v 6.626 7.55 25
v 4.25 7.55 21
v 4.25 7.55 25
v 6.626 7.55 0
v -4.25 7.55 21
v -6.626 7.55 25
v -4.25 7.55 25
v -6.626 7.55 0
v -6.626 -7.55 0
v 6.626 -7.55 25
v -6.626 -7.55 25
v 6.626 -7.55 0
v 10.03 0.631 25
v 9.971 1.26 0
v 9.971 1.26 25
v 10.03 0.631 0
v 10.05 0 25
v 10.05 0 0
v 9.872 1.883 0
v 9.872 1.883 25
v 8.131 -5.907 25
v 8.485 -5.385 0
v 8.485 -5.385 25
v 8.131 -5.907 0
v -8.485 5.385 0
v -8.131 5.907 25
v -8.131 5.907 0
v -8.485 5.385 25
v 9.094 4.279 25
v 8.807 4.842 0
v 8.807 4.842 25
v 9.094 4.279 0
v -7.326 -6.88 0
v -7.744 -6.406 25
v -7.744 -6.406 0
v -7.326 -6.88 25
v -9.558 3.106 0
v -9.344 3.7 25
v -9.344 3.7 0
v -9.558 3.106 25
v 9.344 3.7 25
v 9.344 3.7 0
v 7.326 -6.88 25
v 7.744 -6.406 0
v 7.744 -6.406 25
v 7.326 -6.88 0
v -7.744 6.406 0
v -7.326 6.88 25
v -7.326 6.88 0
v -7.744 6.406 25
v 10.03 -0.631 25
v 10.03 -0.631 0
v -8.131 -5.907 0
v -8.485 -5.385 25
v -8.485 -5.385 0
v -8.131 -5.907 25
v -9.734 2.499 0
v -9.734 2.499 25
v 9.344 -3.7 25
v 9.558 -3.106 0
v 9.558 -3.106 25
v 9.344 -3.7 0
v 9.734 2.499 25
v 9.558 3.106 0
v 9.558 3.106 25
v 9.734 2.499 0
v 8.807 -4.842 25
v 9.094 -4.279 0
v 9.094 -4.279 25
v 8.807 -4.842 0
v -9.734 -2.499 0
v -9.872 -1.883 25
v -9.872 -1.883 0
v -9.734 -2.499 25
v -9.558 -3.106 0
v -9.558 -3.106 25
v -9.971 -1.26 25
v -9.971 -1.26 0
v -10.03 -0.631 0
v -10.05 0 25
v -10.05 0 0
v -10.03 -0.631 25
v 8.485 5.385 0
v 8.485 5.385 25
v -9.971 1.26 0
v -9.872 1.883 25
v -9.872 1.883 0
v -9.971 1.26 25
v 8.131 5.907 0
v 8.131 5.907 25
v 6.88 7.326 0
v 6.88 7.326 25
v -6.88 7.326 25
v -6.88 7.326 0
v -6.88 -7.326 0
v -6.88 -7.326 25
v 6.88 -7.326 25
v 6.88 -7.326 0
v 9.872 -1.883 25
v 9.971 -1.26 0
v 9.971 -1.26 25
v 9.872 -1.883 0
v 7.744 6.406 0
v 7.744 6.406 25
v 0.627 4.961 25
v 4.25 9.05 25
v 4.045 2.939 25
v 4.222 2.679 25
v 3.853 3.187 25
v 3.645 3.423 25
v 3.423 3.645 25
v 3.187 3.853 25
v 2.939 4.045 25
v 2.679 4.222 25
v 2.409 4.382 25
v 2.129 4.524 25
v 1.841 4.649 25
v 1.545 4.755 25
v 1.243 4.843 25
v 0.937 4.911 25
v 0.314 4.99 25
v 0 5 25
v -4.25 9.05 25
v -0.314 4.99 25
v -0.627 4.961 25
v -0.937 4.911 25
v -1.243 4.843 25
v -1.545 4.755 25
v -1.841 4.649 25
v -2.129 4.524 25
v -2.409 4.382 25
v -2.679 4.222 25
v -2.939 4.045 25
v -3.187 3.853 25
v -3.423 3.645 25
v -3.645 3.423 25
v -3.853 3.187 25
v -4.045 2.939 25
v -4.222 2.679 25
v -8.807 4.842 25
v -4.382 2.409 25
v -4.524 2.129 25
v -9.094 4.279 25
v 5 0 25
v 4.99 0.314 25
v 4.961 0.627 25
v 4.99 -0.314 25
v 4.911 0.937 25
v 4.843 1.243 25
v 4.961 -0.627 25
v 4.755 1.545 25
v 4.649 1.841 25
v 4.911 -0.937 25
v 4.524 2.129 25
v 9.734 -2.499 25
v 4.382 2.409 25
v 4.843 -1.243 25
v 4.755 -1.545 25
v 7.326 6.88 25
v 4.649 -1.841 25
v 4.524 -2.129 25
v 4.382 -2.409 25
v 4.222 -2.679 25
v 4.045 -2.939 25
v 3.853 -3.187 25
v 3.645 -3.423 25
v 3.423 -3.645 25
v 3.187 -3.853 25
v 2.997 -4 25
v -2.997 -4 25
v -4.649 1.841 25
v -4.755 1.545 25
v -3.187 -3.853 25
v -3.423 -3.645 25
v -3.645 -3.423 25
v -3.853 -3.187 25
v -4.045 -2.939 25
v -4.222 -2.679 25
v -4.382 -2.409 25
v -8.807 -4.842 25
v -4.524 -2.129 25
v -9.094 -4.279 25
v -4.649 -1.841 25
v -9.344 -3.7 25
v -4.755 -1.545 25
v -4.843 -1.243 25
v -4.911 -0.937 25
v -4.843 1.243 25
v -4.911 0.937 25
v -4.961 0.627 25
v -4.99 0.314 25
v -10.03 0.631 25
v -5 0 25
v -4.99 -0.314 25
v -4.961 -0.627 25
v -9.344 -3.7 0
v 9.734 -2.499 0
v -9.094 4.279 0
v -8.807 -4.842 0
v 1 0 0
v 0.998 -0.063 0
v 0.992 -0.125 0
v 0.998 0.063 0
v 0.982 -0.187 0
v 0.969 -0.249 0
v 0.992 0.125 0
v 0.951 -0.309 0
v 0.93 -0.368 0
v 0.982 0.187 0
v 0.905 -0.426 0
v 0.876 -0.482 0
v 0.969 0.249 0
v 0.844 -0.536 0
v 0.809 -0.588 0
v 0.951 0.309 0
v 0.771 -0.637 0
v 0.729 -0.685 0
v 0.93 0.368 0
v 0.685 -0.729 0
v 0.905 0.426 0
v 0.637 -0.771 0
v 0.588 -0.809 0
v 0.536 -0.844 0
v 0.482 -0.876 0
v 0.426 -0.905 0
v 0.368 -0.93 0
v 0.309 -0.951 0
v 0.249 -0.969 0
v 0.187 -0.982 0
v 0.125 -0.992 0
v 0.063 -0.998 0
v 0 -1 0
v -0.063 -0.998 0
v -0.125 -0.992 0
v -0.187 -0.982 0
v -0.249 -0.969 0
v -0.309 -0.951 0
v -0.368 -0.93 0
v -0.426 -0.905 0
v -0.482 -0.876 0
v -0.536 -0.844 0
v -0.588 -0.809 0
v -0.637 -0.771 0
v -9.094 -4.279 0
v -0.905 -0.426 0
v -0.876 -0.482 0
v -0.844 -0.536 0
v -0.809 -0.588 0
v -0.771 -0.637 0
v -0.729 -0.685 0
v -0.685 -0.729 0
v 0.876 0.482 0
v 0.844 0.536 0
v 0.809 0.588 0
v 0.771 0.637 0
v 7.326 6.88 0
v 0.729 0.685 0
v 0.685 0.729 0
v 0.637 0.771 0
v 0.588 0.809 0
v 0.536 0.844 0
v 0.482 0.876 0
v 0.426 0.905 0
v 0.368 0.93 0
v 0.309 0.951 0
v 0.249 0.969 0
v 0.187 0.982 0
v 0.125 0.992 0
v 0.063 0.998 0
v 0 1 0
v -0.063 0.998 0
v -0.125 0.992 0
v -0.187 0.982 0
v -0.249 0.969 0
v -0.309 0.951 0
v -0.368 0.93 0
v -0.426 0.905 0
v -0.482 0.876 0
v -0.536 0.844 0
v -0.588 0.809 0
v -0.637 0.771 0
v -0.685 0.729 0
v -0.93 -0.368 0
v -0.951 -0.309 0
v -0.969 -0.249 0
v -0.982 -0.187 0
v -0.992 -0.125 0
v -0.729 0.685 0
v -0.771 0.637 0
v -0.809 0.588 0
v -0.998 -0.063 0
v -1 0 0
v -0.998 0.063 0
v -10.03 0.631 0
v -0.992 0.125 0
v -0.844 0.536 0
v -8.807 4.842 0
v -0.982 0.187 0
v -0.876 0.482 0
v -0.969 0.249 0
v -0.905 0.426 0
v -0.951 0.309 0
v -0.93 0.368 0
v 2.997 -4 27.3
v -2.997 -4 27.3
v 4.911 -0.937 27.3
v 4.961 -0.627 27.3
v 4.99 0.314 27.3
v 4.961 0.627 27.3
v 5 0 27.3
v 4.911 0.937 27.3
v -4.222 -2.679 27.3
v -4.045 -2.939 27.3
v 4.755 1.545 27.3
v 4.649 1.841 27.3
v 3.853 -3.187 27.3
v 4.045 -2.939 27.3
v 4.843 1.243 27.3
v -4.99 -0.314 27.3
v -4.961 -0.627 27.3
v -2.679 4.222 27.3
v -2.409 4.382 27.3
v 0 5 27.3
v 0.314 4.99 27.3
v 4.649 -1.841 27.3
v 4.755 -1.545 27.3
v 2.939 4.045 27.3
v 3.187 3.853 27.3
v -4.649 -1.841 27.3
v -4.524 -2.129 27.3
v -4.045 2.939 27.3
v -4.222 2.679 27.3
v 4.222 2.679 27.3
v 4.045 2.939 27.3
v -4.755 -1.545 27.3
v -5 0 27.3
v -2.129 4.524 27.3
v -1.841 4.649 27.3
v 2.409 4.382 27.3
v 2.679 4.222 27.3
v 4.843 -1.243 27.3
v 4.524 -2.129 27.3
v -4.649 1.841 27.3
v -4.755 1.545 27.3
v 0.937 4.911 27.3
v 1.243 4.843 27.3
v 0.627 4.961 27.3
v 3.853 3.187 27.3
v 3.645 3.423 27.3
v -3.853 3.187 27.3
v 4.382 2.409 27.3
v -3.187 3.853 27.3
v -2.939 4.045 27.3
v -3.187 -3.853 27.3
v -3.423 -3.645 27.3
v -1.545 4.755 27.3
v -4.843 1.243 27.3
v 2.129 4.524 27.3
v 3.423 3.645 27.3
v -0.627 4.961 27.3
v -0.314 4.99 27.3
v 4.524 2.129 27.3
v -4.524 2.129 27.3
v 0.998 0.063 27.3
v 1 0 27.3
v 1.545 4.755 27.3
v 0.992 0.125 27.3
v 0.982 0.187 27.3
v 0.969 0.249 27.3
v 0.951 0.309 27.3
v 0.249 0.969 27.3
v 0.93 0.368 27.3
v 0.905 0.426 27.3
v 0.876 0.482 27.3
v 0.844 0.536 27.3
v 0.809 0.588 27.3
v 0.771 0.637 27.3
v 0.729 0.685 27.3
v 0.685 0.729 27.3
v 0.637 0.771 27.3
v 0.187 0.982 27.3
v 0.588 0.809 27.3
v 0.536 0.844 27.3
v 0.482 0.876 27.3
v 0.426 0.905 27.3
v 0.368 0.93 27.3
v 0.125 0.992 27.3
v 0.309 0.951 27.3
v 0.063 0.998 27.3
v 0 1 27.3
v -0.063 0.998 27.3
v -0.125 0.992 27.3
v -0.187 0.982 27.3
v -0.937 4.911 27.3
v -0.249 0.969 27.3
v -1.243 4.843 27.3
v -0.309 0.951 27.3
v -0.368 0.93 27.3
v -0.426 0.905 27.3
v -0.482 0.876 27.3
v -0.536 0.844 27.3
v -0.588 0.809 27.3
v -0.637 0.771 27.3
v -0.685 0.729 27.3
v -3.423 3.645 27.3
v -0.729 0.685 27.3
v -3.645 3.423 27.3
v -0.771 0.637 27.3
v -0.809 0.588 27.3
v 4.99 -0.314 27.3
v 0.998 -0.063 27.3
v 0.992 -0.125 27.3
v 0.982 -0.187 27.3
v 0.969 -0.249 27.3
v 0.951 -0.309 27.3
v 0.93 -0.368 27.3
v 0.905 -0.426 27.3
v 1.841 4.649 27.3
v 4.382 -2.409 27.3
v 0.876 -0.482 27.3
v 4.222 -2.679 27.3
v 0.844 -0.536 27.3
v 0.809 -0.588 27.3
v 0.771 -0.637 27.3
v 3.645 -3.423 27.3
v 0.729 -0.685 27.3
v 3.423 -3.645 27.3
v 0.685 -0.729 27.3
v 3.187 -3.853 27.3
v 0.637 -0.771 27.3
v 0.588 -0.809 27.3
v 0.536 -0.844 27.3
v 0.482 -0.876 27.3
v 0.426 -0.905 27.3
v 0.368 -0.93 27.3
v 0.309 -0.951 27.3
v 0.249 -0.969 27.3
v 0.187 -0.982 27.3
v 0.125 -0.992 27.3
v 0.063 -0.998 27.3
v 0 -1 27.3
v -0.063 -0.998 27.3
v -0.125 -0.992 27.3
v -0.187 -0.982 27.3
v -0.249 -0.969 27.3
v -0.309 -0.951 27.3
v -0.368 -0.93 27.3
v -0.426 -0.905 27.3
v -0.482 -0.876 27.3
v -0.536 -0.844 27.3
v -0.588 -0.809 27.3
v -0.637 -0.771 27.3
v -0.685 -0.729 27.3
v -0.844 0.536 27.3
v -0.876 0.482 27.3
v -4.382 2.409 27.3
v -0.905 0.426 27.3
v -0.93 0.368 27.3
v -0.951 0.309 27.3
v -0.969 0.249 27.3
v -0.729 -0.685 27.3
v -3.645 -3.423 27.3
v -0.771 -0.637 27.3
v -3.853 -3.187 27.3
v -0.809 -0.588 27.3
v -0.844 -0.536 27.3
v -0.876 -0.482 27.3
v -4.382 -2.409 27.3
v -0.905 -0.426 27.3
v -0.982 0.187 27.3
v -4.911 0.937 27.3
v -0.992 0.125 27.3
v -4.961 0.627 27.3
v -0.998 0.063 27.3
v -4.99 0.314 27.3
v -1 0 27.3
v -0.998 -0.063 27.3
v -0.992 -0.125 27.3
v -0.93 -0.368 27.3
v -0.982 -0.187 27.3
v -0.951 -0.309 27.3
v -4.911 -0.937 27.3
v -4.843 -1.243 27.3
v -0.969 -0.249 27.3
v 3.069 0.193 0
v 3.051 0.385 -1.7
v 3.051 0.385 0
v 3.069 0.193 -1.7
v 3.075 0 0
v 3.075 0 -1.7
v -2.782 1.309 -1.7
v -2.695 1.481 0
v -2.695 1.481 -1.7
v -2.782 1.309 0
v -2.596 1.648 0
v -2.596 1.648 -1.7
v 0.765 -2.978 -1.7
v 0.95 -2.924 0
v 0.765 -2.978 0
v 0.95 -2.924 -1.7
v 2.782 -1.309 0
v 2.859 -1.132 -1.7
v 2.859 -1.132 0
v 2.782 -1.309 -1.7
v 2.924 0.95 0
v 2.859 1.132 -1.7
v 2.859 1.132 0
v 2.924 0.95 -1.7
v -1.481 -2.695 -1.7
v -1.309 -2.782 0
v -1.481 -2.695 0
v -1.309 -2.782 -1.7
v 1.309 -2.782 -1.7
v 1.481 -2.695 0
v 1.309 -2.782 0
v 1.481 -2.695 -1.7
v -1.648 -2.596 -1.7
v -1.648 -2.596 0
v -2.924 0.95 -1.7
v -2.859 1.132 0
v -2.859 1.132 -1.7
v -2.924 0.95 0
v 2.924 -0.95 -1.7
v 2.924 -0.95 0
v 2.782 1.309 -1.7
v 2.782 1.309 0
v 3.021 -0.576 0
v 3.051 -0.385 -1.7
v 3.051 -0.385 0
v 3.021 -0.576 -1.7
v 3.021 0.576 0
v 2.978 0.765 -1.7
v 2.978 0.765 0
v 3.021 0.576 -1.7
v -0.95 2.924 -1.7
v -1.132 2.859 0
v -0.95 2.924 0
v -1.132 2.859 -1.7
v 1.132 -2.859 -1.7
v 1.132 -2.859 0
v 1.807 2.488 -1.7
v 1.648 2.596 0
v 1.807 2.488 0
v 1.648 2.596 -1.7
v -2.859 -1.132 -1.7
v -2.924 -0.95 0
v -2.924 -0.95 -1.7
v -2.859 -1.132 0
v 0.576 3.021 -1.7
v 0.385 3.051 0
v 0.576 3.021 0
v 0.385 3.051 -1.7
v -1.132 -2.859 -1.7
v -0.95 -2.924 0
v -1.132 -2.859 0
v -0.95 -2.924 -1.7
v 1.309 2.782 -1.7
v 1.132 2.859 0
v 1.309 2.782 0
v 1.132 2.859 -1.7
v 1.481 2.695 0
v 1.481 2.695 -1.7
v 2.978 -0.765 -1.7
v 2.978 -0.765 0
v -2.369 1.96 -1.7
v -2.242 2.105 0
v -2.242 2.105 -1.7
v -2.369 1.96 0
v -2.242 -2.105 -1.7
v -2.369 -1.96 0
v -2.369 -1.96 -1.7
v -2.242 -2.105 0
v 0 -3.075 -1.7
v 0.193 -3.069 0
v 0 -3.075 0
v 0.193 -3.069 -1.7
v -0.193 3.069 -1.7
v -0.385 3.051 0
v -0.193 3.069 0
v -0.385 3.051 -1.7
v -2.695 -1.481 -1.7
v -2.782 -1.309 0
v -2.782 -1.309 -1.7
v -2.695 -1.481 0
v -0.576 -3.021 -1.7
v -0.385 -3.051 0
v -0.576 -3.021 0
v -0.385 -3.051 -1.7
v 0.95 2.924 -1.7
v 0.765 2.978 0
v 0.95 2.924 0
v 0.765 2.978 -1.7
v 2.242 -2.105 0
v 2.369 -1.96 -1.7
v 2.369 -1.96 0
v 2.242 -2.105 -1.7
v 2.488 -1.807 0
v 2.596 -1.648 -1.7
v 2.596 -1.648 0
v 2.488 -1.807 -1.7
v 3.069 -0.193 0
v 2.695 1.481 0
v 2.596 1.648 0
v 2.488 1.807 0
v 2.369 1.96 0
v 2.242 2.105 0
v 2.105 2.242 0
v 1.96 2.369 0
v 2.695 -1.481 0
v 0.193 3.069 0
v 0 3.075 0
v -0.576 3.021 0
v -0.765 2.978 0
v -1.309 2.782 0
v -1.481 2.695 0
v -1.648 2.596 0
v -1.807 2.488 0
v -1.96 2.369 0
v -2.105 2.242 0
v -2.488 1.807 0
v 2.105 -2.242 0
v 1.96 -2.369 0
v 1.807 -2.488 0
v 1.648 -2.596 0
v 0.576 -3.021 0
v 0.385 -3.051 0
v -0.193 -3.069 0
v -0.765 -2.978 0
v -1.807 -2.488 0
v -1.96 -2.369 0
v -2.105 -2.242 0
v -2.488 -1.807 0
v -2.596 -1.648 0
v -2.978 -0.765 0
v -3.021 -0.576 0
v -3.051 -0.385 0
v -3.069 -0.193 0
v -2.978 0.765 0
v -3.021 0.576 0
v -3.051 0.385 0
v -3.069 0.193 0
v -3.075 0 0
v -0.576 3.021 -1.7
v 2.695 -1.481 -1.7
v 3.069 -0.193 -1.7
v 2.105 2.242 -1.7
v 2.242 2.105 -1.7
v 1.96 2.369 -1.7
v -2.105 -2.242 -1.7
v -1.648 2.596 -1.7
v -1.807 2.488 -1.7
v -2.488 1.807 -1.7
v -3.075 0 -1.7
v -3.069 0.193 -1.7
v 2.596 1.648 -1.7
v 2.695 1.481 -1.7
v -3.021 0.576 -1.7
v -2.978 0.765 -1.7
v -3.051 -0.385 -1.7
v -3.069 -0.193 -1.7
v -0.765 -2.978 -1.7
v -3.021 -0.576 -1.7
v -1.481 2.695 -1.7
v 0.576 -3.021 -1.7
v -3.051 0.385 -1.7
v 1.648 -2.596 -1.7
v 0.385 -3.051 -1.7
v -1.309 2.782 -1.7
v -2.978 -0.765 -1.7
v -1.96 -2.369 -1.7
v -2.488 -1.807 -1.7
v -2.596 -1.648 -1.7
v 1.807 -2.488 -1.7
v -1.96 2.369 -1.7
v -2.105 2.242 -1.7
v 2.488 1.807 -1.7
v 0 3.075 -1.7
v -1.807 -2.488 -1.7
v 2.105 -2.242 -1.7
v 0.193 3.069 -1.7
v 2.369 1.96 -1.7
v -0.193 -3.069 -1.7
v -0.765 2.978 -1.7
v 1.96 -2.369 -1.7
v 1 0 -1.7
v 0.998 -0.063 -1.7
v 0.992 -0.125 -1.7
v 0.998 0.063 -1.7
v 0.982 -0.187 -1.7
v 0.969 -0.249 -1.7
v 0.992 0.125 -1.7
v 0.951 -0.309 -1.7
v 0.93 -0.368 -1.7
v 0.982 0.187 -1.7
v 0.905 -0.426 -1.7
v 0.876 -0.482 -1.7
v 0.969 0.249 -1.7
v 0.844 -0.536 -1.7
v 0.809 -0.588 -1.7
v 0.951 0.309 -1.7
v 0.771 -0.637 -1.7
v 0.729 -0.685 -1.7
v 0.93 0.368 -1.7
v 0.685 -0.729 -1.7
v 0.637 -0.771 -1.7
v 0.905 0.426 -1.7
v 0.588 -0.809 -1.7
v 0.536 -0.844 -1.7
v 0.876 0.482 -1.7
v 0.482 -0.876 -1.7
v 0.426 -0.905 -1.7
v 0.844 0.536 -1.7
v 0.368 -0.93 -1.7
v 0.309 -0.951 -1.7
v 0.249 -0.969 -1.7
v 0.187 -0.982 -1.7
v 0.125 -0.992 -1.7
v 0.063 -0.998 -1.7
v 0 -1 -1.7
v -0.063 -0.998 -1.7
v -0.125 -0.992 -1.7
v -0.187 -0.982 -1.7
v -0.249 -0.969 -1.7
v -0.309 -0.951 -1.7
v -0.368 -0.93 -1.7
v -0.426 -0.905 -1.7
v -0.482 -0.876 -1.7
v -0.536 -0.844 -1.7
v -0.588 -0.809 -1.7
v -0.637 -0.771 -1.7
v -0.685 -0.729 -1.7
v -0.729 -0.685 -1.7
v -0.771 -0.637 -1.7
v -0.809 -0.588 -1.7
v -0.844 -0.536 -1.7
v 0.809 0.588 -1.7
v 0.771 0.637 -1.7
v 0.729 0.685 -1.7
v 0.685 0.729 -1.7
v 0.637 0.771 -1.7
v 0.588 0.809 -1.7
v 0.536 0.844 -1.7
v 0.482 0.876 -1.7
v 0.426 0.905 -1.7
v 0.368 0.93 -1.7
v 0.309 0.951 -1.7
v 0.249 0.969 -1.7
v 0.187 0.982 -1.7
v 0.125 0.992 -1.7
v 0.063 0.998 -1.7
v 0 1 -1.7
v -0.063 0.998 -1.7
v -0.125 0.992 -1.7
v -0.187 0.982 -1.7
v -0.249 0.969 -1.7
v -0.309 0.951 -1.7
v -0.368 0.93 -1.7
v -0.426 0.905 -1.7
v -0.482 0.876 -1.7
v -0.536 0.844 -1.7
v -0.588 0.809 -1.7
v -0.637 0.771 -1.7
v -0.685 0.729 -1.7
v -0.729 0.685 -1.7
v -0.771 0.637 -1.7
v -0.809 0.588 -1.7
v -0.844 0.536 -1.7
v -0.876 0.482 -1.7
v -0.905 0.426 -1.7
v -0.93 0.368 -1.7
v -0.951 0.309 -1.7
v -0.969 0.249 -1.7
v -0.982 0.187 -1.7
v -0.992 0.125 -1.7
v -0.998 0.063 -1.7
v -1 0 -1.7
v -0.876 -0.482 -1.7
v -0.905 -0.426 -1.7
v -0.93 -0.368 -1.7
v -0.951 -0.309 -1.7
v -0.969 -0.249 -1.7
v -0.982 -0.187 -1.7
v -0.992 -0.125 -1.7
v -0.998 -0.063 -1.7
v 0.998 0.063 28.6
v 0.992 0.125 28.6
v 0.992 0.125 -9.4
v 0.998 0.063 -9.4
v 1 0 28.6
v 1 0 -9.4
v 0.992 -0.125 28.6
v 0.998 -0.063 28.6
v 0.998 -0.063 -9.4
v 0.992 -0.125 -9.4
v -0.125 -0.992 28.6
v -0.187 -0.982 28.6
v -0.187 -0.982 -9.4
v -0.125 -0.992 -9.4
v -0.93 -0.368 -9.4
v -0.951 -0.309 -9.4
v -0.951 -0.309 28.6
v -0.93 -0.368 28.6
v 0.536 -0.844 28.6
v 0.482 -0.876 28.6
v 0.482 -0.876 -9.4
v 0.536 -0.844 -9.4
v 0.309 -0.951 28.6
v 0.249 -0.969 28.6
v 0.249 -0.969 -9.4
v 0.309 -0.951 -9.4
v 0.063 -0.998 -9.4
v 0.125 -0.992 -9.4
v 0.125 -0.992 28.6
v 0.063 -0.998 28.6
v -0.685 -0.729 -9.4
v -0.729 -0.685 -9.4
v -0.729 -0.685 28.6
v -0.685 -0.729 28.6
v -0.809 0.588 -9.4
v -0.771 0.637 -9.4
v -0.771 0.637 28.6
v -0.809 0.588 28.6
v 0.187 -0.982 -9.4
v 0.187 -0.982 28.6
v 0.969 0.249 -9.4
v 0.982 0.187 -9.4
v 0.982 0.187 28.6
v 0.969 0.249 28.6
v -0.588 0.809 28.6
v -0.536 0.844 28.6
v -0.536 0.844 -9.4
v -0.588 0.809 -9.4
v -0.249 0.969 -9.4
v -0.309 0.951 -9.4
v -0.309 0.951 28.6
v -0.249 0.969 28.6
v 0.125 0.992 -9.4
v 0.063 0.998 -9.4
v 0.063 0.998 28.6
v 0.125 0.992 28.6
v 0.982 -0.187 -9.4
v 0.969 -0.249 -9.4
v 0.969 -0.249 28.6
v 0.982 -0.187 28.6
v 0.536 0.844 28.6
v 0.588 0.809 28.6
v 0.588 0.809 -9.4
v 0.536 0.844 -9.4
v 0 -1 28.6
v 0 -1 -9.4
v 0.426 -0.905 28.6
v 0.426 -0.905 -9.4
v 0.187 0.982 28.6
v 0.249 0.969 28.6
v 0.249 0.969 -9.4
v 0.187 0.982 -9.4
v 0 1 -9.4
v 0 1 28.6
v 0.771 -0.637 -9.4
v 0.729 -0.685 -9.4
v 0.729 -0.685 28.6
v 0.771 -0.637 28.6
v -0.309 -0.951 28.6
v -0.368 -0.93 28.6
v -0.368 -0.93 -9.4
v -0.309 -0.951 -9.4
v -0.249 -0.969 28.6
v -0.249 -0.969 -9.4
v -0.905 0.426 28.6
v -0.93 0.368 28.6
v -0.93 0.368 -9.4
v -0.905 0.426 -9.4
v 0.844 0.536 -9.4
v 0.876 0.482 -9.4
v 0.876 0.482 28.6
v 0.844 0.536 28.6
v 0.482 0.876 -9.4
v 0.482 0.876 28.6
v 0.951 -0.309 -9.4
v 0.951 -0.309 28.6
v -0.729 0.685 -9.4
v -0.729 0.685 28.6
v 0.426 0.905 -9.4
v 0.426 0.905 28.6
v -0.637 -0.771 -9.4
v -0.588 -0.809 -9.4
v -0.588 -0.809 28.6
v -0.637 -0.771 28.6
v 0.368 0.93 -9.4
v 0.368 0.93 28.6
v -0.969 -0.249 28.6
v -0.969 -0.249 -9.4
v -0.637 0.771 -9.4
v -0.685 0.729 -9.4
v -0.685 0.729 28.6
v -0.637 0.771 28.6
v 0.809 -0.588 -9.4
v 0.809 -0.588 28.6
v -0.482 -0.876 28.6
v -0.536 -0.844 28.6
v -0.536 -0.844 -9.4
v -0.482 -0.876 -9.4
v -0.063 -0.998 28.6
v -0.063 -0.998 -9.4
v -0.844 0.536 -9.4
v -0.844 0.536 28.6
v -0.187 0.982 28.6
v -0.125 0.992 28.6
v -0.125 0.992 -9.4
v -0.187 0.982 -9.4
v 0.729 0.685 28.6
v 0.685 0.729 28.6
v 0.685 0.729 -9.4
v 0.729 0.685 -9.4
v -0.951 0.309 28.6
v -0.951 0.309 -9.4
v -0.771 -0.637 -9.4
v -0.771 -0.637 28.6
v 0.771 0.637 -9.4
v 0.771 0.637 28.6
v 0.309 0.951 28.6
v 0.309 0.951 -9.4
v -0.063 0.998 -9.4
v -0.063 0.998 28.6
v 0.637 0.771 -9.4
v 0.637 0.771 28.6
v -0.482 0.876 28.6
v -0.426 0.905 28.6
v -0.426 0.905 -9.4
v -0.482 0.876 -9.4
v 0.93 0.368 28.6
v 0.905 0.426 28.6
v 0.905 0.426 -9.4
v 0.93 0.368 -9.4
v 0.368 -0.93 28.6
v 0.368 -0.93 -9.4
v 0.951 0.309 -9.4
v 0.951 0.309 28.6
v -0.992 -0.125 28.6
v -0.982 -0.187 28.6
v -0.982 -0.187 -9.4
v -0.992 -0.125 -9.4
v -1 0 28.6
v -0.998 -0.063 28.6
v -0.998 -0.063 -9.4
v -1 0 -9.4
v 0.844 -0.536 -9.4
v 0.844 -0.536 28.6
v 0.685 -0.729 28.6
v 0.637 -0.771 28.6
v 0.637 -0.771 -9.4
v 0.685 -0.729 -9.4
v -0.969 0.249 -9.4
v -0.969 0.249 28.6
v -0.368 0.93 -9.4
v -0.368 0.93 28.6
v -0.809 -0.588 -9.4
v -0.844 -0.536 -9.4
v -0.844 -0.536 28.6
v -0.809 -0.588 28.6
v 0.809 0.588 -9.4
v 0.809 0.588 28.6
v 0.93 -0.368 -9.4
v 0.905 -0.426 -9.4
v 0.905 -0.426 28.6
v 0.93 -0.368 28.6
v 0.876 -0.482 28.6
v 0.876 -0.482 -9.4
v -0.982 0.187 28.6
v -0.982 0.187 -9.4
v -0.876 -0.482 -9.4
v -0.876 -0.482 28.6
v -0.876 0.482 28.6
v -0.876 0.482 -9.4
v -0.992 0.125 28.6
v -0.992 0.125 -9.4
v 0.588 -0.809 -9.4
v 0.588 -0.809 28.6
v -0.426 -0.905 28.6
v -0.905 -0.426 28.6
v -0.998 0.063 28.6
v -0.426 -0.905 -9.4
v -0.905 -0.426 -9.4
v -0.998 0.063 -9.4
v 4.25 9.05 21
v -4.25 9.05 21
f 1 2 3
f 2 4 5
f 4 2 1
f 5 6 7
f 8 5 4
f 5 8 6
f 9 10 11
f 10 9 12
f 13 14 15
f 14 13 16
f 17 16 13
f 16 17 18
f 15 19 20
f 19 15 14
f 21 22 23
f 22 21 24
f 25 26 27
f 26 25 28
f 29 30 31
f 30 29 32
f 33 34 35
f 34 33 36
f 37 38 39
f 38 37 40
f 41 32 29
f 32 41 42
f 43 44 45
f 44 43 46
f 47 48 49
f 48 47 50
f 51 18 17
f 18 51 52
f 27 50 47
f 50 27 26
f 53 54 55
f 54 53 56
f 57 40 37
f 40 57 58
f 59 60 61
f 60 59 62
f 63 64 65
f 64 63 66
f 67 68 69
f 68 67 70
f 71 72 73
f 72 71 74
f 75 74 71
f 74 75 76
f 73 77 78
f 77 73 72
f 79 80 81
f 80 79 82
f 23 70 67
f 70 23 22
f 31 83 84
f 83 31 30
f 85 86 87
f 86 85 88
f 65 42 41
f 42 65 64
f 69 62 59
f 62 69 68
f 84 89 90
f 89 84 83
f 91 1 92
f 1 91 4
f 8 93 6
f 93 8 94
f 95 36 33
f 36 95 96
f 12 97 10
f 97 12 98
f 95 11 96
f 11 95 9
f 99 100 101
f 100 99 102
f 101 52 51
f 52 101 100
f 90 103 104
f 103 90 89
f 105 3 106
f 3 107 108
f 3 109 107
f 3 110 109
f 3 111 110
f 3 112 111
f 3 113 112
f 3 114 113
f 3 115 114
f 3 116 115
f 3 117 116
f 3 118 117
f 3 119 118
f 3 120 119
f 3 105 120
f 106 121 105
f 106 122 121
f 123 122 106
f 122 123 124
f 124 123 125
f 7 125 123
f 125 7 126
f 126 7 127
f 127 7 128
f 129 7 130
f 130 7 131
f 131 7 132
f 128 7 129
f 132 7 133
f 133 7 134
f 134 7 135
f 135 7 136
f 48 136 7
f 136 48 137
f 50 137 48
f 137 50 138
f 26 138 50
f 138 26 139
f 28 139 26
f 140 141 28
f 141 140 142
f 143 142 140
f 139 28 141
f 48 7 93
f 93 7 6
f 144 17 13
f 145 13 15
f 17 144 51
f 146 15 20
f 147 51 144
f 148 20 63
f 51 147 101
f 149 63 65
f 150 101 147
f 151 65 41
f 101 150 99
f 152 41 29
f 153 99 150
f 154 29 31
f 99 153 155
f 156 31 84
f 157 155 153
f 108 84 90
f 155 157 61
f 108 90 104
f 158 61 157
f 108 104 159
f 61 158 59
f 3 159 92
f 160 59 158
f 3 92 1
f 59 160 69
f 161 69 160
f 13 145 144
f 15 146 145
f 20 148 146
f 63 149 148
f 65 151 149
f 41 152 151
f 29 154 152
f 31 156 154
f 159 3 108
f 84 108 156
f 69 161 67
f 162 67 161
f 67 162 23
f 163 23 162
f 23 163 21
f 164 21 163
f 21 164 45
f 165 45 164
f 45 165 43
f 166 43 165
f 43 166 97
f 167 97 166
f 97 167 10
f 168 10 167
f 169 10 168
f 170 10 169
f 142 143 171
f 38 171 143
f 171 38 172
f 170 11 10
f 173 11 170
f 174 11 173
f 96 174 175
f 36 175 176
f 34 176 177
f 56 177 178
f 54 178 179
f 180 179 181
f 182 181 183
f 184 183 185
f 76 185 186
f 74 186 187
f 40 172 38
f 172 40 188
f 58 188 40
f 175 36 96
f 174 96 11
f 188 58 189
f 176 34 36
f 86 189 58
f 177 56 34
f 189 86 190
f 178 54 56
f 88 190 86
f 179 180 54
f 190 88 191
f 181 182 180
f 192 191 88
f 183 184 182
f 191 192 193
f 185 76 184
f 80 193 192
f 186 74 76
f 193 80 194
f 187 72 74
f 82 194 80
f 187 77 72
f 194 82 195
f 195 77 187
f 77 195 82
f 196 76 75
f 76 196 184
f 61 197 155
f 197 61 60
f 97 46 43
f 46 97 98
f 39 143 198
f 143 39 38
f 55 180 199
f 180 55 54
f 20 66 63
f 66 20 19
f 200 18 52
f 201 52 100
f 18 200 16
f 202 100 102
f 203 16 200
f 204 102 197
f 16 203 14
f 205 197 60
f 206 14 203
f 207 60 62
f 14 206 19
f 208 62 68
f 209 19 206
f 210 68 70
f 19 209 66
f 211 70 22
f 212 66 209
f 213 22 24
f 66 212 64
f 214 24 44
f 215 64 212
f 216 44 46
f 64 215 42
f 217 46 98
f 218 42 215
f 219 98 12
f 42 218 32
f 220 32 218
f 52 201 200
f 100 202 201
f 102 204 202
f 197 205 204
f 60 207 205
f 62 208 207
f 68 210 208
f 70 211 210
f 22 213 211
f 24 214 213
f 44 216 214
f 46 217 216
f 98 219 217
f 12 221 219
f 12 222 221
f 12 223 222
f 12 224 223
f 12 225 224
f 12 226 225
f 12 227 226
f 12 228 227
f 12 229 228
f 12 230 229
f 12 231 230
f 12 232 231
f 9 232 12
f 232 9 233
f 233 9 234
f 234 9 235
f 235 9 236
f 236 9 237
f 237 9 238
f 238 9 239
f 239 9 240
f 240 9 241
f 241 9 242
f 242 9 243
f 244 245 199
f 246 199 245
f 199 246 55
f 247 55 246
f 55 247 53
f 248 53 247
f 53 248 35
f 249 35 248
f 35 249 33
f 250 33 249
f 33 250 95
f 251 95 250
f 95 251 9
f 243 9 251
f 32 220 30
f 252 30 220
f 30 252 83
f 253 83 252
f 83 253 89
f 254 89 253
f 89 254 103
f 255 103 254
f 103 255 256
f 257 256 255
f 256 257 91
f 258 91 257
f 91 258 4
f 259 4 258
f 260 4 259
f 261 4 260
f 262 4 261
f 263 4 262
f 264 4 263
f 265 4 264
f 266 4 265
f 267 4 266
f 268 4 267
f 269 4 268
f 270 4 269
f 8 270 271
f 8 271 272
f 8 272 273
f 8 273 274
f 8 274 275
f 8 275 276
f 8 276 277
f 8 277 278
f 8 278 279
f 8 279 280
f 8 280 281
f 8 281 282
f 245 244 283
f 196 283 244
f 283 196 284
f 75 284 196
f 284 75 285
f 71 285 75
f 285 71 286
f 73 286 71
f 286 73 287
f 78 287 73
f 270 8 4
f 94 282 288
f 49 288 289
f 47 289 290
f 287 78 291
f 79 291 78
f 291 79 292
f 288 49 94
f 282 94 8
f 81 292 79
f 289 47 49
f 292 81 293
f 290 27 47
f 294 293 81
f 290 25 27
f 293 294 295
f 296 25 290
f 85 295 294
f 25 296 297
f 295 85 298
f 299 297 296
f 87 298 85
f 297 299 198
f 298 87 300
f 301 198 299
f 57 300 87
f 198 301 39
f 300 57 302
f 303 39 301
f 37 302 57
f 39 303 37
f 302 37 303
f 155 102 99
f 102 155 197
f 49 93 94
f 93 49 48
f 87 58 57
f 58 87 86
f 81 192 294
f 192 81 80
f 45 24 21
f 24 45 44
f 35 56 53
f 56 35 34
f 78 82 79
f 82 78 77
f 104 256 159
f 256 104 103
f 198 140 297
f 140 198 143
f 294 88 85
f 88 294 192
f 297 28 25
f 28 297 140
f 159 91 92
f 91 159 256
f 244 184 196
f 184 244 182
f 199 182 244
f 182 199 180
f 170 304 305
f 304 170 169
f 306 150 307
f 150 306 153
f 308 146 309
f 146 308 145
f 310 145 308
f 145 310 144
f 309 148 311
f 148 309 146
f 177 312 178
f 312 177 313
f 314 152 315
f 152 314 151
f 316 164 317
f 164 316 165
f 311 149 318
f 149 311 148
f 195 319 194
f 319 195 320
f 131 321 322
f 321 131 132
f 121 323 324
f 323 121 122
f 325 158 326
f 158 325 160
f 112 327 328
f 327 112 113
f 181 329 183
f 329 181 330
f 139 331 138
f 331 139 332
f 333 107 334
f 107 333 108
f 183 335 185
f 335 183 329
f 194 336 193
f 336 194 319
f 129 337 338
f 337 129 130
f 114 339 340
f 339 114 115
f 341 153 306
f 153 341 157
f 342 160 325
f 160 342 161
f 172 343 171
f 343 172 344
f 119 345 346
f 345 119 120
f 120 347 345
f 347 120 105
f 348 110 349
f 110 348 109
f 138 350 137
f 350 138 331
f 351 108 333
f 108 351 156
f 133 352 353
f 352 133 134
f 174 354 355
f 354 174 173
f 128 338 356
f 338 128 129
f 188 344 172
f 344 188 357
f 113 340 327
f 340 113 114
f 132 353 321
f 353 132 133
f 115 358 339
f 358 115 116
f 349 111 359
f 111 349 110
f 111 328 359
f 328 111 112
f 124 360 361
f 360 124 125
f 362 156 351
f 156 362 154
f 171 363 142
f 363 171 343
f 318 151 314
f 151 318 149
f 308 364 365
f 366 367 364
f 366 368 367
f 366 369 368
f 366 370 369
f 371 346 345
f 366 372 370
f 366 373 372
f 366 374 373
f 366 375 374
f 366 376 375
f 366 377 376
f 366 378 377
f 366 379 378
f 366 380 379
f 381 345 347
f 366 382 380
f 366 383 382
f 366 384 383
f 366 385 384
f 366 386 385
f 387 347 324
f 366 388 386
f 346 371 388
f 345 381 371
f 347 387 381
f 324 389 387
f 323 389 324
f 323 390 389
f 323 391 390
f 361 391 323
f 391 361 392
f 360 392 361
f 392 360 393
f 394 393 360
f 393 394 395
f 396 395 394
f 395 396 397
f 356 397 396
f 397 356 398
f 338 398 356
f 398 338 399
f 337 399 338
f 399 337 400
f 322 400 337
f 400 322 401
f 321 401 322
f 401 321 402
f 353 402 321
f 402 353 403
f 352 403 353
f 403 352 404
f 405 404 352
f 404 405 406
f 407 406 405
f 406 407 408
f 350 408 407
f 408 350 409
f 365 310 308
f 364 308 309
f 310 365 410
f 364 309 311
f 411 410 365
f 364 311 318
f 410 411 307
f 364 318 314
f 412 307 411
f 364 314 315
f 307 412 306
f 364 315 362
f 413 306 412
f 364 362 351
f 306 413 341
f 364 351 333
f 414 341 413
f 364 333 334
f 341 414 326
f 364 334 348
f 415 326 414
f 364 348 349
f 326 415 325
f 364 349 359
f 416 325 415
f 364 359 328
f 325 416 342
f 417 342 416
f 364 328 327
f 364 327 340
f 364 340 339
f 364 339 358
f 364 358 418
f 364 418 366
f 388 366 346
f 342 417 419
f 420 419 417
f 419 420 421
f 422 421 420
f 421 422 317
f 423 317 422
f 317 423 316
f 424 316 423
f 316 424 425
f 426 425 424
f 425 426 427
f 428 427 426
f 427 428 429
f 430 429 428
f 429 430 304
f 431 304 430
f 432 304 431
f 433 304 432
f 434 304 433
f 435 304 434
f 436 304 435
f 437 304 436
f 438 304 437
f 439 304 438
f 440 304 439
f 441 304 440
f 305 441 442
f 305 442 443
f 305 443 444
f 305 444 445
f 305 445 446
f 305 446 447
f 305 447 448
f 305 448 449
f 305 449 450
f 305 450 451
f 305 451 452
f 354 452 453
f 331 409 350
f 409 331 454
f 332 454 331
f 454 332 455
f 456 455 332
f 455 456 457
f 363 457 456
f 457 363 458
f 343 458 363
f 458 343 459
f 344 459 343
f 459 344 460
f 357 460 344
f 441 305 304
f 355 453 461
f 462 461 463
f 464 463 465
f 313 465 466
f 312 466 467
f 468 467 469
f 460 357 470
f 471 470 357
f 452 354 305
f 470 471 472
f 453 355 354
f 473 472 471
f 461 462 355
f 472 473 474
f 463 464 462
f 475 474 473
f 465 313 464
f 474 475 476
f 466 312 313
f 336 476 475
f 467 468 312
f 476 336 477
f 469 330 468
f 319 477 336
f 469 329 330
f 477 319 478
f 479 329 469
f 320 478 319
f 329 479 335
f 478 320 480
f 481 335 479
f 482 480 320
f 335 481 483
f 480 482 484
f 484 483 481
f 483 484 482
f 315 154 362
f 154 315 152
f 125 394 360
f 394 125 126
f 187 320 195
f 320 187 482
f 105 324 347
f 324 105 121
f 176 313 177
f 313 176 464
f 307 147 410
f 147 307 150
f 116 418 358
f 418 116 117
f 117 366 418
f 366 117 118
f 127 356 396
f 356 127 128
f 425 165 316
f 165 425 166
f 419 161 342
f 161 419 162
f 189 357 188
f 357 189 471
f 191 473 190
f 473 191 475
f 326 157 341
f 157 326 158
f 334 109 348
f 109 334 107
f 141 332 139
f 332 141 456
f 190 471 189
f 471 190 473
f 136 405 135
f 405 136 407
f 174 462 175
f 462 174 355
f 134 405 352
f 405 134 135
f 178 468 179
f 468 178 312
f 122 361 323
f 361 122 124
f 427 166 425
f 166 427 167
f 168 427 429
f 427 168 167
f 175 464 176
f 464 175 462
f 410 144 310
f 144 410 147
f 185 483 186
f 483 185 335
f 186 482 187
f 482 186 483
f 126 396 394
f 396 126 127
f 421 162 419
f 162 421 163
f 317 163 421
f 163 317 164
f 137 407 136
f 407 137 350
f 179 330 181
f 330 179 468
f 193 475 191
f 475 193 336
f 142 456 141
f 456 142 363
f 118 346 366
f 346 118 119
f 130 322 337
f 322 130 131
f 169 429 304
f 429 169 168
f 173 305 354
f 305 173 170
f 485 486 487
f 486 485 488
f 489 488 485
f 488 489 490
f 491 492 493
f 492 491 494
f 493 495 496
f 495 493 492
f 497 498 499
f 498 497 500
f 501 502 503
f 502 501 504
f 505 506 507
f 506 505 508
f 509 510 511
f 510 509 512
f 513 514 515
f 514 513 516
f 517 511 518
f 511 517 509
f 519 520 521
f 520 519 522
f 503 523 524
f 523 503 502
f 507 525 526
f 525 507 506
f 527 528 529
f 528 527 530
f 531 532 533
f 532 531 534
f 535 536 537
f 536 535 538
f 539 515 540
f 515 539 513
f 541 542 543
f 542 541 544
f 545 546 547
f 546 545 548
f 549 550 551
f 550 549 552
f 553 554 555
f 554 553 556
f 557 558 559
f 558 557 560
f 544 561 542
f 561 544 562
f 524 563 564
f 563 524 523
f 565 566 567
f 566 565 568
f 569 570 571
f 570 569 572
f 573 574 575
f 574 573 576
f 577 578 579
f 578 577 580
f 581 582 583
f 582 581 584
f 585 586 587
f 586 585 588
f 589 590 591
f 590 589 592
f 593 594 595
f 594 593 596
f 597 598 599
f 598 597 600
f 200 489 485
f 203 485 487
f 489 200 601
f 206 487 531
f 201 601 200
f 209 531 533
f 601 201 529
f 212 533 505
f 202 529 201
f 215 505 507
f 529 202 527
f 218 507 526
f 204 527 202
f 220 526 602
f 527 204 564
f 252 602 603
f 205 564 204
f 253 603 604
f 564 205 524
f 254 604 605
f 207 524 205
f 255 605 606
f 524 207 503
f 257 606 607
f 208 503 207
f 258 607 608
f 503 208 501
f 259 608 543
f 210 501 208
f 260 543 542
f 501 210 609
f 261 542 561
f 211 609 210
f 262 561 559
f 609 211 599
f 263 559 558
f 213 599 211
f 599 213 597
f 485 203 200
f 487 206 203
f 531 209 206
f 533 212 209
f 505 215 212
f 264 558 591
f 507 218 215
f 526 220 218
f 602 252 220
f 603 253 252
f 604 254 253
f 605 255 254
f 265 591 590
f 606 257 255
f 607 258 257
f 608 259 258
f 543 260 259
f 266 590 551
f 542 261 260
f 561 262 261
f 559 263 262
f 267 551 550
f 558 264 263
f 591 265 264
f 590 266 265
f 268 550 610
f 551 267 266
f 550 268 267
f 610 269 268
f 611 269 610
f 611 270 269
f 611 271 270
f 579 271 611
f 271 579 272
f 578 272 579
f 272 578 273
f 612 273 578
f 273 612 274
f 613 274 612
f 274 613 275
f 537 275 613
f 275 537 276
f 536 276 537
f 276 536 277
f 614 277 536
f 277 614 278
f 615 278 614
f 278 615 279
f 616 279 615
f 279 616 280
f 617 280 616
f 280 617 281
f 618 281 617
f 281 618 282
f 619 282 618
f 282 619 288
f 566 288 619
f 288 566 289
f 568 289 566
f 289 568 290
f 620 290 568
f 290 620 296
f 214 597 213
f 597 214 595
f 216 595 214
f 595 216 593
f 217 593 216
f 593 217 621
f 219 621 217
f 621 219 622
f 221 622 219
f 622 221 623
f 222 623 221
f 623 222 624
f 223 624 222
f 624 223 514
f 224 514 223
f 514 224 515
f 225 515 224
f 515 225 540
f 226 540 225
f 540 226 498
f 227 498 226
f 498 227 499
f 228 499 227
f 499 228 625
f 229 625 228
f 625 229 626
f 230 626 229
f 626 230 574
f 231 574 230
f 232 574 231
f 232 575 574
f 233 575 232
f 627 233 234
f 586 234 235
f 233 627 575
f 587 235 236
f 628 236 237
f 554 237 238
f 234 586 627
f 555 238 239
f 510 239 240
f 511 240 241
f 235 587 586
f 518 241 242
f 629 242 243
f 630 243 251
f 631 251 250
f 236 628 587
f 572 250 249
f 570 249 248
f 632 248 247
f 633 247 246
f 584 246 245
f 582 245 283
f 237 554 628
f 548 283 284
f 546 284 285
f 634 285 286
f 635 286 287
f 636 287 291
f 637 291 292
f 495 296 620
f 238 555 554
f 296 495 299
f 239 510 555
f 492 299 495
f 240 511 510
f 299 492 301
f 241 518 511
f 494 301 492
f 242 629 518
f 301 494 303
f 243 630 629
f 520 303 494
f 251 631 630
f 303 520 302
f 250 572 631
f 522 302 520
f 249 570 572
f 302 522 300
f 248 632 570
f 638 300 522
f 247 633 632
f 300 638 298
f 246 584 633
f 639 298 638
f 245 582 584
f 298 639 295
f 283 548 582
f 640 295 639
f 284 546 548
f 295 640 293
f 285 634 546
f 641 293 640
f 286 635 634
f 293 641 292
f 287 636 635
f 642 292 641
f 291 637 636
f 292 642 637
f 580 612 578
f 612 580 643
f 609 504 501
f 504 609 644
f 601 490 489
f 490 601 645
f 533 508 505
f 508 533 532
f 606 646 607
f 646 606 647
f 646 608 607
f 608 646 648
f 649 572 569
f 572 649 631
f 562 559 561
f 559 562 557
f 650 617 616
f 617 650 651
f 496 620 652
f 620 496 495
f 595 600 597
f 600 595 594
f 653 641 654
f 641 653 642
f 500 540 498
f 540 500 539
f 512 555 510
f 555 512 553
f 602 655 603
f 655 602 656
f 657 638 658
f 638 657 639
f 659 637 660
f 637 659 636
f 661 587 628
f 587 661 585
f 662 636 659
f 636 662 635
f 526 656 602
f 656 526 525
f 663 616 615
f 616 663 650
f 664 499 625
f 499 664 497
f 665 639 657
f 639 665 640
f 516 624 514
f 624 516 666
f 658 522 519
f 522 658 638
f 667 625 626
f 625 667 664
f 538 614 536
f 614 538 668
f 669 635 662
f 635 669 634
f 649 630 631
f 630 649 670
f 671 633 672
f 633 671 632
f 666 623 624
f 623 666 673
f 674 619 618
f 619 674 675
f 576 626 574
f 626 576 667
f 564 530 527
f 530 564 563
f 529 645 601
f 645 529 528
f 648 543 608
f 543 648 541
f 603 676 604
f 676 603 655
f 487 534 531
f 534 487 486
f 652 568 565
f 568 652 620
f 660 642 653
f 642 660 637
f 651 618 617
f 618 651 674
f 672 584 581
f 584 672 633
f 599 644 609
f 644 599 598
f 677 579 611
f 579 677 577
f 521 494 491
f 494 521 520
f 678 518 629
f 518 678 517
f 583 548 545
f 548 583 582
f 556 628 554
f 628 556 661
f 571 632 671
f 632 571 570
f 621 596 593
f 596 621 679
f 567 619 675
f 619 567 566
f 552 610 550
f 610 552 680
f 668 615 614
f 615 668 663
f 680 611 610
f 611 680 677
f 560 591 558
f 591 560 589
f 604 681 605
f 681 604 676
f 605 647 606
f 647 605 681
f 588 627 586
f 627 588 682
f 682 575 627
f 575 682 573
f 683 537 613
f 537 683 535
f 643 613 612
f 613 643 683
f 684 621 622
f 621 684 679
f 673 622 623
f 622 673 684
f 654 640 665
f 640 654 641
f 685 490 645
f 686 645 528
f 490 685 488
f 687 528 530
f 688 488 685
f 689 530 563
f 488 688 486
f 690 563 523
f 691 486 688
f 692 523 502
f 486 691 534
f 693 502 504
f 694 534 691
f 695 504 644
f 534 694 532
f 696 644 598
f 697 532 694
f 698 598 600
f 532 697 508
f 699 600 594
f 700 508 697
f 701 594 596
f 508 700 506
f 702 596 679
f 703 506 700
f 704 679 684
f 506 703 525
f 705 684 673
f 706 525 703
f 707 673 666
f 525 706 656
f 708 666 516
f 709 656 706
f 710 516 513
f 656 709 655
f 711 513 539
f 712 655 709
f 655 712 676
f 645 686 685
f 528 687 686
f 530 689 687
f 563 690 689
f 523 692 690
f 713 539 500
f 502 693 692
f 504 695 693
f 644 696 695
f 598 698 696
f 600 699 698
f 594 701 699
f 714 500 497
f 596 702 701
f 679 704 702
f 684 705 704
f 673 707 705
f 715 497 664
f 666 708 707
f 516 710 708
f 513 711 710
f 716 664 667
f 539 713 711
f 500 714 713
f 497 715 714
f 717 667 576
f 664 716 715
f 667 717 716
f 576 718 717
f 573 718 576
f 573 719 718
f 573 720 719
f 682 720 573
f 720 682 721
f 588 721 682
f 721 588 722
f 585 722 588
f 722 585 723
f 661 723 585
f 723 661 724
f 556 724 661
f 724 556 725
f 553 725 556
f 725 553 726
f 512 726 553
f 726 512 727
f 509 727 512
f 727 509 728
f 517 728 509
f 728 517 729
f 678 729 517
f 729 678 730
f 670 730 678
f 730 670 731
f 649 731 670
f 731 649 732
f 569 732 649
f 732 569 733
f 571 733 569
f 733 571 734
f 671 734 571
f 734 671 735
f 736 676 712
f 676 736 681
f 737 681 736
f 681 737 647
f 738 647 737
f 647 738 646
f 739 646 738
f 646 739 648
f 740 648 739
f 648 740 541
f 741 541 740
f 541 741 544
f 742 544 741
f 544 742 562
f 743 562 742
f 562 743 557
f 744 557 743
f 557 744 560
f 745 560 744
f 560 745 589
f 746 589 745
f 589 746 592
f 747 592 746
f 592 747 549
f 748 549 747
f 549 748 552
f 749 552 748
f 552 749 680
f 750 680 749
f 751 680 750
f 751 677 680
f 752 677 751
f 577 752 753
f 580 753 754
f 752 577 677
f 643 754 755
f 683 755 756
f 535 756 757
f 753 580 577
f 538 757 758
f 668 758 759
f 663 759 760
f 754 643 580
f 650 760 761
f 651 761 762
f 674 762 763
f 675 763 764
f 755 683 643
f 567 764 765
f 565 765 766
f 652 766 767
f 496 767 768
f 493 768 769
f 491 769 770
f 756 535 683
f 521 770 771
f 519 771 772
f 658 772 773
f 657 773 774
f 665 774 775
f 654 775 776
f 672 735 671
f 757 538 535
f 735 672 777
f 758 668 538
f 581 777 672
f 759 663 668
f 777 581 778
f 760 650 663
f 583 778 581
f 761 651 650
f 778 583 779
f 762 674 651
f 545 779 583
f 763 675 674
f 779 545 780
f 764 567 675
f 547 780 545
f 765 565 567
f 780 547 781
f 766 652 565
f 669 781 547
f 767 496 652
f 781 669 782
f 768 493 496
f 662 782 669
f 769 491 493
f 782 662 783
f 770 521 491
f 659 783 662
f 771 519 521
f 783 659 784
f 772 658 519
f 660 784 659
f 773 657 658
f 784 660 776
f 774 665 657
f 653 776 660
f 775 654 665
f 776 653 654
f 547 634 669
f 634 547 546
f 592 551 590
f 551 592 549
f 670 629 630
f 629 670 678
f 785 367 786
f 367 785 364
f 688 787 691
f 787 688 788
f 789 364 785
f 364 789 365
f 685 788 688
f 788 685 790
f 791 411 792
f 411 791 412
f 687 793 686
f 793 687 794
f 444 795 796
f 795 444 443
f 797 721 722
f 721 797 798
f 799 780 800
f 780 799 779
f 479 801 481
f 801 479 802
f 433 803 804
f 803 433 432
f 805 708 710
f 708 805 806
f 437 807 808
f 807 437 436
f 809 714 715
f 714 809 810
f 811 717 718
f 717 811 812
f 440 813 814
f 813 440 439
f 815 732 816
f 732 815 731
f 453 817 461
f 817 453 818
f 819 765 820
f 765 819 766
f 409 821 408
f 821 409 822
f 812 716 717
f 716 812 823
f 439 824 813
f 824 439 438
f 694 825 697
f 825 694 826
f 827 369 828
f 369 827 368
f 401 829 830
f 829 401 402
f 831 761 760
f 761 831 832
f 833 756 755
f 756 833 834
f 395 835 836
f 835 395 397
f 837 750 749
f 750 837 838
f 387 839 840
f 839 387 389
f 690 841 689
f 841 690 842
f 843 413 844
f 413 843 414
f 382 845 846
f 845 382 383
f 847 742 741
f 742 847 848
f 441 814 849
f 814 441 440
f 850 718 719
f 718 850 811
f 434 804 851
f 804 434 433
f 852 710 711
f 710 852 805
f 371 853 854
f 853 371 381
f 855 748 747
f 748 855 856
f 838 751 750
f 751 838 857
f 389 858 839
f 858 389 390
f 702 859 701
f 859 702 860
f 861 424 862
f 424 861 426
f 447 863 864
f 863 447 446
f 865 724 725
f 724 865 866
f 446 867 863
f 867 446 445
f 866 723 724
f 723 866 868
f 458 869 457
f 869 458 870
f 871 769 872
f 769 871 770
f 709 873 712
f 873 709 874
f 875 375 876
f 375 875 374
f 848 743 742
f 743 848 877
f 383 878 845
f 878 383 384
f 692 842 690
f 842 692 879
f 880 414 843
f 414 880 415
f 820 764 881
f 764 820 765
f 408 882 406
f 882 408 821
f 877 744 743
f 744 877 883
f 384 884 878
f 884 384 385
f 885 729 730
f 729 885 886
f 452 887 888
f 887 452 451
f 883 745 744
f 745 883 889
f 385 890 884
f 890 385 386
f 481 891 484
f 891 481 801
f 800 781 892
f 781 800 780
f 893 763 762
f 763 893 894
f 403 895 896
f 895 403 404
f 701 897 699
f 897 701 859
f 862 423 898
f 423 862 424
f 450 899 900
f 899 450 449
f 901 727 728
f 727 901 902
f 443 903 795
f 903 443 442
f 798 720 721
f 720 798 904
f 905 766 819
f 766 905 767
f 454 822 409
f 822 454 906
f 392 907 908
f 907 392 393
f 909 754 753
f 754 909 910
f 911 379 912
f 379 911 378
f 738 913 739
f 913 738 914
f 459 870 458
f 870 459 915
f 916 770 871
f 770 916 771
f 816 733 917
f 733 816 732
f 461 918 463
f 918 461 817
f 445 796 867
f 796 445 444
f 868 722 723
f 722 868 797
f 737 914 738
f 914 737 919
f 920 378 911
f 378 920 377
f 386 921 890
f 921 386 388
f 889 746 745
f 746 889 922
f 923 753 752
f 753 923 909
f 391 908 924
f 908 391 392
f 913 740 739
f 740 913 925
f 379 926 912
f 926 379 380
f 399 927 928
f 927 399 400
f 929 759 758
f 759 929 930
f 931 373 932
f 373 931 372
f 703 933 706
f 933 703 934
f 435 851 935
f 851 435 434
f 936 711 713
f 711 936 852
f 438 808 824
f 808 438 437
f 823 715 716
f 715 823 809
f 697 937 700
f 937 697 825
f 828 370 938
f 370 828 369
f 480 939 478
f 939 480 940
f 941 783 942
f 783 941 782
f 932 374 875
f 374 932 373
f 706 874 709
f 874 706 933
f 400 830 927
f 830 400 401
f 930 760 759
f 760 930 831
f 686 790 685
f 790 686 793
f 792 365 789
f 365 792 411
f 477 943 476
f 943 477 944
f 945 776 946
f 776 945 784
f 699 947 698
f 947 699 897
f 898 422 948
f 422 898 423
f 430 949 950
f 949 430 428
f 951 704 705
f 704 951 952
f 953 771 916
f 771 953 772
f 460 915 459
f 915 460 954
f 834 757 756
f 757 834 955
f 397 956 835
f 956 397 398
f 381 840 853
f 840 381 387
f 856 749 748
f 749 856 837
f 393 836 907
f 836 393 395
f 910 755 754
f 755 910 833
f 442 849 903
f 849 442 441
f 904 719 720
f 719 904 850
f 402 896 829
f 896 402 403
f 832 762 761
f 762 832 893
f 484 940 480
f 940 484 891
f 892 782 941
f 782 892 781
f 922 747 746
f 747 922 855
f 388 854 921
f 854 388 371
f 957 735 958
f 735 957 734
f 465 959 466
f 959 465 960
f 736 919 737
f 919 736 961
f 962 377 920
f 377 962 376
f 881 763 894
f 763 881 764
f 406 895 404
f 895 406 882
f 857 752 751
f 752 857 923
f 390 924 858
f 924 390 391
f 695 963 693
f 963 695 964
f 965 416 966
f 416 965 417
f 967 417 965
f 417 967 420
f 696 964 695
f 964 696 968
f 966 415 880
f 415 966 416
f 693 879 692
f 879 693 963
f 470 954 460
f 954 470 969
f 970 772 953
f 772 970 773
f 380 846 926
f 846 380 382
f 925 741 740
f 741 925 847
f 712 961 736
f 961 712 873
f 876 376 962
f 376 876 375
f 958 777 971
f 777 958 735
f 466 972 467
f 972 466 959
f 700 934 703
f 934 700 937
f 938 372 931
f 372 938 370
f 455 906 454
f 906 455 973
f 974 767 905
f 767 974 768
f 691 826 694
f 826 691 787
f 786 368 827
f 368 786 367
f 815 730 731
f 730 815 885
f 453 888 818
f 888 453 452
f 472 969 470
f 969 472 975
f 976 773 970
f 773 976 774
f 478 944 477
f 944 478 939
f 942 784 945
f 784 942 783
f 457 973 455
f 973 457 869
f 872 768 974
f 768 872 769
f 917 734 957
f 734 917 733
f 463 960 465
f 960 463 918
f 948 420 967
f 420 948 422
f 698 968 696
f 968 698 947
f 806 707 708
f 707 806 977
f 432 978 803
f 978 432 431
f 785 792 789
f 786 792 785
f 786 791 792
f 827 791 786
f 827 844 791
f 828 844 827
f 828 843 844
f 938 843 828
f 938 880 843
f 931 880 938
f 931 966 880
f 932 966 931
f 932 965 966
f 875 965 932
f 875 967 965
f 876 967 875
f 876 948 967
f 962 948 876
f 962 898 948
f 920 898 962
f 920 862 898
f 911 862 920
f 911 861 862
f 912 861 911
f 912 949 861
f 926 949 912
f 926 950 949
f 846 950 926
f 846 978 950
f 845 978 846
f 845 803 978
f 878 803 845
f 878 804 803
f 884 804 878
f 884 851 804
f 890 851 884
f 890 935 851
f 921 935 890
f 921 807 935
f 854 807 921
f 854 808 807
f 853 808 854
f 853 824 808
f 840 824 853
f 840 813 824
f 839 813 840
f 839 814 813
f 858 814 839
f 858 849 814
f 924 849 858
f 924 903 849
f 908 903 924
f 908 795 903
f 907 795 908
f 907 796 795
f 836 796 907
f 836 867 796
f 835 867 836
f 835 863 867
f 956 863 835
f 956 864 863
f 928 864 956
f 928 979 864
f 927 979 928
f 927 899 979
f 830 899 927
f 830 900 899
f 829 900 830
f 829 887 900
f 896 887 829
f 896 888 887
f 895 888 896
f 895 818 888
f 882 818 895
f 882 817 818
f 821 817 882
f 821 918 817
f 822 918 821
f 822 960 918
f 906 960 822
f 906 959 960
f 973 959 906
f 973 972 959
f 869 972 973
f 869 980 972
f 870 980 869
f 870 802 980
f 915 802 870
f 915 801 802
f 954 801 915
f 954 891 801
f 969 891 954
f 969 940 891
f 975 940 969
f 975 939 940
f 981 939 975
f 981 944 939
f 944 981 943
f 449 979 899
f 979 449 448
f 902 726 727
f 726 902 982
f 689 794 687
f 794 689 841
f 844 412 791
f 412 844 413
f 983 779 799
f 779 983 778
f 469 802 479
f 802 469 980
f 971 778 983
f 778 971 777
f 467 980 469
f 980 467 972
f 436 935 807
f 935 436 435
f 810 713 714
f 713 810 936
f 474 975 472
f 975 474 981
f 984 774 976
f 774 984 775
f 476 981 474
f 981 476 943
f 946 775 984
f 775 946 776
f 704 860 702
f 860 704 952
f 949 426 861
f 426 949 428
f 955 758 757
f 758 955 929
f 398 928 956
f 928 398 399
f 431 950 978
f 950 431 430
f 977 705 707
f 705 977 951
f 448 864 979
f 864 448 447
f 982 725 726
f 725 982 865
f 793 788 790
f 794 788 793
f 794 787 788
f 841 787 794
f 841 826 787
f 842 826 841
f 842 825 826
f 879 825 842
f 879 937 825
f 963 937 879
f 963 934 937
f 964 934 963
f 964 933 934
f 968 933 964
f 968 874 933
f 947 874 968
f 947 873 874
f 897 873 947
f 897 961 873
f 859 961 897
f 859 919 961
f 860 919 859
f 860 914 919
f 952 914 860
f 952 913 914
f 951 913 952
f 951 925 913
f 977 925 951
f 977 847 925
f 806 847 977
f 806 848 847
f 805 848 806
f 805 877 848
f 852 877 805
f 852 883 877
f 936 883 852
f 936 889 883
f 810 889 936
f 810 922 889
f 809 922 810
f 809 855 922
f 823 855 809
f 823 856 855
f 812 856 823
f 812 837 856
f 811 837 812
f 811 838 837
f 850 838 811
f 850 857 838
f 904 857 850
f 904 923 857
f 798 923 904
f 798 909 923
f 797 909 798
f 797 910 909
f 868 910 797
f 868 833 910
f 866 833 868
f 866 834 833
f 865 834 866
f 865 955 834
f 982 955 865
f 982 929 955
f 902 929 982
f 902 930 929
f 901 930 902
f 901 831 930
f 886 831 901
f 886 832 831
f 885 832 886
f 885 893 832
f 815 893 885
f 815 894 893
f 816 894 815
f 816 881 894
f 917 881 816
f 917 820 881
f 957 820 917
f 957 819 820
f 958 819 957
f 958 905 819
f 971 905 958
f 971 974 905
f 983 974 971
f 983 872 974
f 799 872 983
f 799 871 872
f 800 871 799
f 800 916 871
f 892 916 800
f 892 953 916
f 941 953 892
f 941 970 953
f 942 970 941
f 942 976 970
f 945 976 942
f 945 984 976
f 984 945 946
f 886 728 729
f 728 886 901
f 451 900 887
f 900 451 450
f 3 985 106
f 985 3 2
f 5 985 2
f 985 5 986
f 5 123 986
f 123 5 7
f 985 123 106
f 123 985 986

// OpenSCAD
// ===== MAIN PARAMETERS =====
// Motor body dimensions
motor_outer_dia = 20.10;
motor_length = 25;
motor_flat_width = 15.10;
 
// Shaft dimensions
shaft_main_dia = 6.15;
shaft_main_length = 1.70;
shaft_extension_dia = 2;
shaft_extension_length = 38;
shaft_extension_pos = -9.4;

// Top connector dimensions
top_connector_dia = 10;
top_connector_height = 2.30;
top_connector_cube_size = 10;
top_connector_offset = 4;

// Tab dimensions
tab_width = 8.5;
tab_thickness = 1.5;
tab_height = 4;

// Rendering quality
$fn = 100;

// ===== MAIN ASSEMBLY =====
module F130Motor(){
    motor_body();
    translate([0, 0, motor_length]) top_connector();
    translate([0, 0, -shaft_main_length]) shaft_assembly();
    mounting_tab();
}

F130Motor();
// ===== MODULES =====

// Motor body - cylindrical with flat side
module motor_body() {
    intersection() {
        centered_cube(100, motor_flat_width, 100);
        cylinder(motor_length, motor_outer_dia/2, motor_outer_dia/2);
    }
}

// Top connector with D-shaft cutout
module top_connector() {
    intersection() {
        translate([0, top_connector_dia/2 - top_connector_offset, 0]) {
            centered_cube(top_connector_cube_size, top_connector_cube_size, top_connector_cube_size); 
        }
        cylinder(top_connector_height, top_connector_dia/2, top_connector_dia/2);
    }
}

// Shaft assembly (main shaft + extension)
module shaft_assembly() {
    // Main shaft section
    cylinder(shaft_main_length, shaft_main_dia/2, shaft_main_dia/2);
    
    // Extended thin shaft
    translate([0, 0, shaft_extension_pos+ shaft_main_length]) {
        cylinder(shaft_extension_length, shaft_extension_dia/2, shaft_extension_dia/2);
    }
}

// Mounting tab on the side
module mounting_tab() {
    translate([-tab_width/2, motor_flat_width/2, motor_length - tab_height]) {
        cube([tab_width, tab_thickness, tab_height]);
    }
}

// Utility: Centered cube
module centered_cube(x, y, z) {
    translate([-x/2, -y/2, -z/2]) {
        cube([x, y, z]);
    }
}
